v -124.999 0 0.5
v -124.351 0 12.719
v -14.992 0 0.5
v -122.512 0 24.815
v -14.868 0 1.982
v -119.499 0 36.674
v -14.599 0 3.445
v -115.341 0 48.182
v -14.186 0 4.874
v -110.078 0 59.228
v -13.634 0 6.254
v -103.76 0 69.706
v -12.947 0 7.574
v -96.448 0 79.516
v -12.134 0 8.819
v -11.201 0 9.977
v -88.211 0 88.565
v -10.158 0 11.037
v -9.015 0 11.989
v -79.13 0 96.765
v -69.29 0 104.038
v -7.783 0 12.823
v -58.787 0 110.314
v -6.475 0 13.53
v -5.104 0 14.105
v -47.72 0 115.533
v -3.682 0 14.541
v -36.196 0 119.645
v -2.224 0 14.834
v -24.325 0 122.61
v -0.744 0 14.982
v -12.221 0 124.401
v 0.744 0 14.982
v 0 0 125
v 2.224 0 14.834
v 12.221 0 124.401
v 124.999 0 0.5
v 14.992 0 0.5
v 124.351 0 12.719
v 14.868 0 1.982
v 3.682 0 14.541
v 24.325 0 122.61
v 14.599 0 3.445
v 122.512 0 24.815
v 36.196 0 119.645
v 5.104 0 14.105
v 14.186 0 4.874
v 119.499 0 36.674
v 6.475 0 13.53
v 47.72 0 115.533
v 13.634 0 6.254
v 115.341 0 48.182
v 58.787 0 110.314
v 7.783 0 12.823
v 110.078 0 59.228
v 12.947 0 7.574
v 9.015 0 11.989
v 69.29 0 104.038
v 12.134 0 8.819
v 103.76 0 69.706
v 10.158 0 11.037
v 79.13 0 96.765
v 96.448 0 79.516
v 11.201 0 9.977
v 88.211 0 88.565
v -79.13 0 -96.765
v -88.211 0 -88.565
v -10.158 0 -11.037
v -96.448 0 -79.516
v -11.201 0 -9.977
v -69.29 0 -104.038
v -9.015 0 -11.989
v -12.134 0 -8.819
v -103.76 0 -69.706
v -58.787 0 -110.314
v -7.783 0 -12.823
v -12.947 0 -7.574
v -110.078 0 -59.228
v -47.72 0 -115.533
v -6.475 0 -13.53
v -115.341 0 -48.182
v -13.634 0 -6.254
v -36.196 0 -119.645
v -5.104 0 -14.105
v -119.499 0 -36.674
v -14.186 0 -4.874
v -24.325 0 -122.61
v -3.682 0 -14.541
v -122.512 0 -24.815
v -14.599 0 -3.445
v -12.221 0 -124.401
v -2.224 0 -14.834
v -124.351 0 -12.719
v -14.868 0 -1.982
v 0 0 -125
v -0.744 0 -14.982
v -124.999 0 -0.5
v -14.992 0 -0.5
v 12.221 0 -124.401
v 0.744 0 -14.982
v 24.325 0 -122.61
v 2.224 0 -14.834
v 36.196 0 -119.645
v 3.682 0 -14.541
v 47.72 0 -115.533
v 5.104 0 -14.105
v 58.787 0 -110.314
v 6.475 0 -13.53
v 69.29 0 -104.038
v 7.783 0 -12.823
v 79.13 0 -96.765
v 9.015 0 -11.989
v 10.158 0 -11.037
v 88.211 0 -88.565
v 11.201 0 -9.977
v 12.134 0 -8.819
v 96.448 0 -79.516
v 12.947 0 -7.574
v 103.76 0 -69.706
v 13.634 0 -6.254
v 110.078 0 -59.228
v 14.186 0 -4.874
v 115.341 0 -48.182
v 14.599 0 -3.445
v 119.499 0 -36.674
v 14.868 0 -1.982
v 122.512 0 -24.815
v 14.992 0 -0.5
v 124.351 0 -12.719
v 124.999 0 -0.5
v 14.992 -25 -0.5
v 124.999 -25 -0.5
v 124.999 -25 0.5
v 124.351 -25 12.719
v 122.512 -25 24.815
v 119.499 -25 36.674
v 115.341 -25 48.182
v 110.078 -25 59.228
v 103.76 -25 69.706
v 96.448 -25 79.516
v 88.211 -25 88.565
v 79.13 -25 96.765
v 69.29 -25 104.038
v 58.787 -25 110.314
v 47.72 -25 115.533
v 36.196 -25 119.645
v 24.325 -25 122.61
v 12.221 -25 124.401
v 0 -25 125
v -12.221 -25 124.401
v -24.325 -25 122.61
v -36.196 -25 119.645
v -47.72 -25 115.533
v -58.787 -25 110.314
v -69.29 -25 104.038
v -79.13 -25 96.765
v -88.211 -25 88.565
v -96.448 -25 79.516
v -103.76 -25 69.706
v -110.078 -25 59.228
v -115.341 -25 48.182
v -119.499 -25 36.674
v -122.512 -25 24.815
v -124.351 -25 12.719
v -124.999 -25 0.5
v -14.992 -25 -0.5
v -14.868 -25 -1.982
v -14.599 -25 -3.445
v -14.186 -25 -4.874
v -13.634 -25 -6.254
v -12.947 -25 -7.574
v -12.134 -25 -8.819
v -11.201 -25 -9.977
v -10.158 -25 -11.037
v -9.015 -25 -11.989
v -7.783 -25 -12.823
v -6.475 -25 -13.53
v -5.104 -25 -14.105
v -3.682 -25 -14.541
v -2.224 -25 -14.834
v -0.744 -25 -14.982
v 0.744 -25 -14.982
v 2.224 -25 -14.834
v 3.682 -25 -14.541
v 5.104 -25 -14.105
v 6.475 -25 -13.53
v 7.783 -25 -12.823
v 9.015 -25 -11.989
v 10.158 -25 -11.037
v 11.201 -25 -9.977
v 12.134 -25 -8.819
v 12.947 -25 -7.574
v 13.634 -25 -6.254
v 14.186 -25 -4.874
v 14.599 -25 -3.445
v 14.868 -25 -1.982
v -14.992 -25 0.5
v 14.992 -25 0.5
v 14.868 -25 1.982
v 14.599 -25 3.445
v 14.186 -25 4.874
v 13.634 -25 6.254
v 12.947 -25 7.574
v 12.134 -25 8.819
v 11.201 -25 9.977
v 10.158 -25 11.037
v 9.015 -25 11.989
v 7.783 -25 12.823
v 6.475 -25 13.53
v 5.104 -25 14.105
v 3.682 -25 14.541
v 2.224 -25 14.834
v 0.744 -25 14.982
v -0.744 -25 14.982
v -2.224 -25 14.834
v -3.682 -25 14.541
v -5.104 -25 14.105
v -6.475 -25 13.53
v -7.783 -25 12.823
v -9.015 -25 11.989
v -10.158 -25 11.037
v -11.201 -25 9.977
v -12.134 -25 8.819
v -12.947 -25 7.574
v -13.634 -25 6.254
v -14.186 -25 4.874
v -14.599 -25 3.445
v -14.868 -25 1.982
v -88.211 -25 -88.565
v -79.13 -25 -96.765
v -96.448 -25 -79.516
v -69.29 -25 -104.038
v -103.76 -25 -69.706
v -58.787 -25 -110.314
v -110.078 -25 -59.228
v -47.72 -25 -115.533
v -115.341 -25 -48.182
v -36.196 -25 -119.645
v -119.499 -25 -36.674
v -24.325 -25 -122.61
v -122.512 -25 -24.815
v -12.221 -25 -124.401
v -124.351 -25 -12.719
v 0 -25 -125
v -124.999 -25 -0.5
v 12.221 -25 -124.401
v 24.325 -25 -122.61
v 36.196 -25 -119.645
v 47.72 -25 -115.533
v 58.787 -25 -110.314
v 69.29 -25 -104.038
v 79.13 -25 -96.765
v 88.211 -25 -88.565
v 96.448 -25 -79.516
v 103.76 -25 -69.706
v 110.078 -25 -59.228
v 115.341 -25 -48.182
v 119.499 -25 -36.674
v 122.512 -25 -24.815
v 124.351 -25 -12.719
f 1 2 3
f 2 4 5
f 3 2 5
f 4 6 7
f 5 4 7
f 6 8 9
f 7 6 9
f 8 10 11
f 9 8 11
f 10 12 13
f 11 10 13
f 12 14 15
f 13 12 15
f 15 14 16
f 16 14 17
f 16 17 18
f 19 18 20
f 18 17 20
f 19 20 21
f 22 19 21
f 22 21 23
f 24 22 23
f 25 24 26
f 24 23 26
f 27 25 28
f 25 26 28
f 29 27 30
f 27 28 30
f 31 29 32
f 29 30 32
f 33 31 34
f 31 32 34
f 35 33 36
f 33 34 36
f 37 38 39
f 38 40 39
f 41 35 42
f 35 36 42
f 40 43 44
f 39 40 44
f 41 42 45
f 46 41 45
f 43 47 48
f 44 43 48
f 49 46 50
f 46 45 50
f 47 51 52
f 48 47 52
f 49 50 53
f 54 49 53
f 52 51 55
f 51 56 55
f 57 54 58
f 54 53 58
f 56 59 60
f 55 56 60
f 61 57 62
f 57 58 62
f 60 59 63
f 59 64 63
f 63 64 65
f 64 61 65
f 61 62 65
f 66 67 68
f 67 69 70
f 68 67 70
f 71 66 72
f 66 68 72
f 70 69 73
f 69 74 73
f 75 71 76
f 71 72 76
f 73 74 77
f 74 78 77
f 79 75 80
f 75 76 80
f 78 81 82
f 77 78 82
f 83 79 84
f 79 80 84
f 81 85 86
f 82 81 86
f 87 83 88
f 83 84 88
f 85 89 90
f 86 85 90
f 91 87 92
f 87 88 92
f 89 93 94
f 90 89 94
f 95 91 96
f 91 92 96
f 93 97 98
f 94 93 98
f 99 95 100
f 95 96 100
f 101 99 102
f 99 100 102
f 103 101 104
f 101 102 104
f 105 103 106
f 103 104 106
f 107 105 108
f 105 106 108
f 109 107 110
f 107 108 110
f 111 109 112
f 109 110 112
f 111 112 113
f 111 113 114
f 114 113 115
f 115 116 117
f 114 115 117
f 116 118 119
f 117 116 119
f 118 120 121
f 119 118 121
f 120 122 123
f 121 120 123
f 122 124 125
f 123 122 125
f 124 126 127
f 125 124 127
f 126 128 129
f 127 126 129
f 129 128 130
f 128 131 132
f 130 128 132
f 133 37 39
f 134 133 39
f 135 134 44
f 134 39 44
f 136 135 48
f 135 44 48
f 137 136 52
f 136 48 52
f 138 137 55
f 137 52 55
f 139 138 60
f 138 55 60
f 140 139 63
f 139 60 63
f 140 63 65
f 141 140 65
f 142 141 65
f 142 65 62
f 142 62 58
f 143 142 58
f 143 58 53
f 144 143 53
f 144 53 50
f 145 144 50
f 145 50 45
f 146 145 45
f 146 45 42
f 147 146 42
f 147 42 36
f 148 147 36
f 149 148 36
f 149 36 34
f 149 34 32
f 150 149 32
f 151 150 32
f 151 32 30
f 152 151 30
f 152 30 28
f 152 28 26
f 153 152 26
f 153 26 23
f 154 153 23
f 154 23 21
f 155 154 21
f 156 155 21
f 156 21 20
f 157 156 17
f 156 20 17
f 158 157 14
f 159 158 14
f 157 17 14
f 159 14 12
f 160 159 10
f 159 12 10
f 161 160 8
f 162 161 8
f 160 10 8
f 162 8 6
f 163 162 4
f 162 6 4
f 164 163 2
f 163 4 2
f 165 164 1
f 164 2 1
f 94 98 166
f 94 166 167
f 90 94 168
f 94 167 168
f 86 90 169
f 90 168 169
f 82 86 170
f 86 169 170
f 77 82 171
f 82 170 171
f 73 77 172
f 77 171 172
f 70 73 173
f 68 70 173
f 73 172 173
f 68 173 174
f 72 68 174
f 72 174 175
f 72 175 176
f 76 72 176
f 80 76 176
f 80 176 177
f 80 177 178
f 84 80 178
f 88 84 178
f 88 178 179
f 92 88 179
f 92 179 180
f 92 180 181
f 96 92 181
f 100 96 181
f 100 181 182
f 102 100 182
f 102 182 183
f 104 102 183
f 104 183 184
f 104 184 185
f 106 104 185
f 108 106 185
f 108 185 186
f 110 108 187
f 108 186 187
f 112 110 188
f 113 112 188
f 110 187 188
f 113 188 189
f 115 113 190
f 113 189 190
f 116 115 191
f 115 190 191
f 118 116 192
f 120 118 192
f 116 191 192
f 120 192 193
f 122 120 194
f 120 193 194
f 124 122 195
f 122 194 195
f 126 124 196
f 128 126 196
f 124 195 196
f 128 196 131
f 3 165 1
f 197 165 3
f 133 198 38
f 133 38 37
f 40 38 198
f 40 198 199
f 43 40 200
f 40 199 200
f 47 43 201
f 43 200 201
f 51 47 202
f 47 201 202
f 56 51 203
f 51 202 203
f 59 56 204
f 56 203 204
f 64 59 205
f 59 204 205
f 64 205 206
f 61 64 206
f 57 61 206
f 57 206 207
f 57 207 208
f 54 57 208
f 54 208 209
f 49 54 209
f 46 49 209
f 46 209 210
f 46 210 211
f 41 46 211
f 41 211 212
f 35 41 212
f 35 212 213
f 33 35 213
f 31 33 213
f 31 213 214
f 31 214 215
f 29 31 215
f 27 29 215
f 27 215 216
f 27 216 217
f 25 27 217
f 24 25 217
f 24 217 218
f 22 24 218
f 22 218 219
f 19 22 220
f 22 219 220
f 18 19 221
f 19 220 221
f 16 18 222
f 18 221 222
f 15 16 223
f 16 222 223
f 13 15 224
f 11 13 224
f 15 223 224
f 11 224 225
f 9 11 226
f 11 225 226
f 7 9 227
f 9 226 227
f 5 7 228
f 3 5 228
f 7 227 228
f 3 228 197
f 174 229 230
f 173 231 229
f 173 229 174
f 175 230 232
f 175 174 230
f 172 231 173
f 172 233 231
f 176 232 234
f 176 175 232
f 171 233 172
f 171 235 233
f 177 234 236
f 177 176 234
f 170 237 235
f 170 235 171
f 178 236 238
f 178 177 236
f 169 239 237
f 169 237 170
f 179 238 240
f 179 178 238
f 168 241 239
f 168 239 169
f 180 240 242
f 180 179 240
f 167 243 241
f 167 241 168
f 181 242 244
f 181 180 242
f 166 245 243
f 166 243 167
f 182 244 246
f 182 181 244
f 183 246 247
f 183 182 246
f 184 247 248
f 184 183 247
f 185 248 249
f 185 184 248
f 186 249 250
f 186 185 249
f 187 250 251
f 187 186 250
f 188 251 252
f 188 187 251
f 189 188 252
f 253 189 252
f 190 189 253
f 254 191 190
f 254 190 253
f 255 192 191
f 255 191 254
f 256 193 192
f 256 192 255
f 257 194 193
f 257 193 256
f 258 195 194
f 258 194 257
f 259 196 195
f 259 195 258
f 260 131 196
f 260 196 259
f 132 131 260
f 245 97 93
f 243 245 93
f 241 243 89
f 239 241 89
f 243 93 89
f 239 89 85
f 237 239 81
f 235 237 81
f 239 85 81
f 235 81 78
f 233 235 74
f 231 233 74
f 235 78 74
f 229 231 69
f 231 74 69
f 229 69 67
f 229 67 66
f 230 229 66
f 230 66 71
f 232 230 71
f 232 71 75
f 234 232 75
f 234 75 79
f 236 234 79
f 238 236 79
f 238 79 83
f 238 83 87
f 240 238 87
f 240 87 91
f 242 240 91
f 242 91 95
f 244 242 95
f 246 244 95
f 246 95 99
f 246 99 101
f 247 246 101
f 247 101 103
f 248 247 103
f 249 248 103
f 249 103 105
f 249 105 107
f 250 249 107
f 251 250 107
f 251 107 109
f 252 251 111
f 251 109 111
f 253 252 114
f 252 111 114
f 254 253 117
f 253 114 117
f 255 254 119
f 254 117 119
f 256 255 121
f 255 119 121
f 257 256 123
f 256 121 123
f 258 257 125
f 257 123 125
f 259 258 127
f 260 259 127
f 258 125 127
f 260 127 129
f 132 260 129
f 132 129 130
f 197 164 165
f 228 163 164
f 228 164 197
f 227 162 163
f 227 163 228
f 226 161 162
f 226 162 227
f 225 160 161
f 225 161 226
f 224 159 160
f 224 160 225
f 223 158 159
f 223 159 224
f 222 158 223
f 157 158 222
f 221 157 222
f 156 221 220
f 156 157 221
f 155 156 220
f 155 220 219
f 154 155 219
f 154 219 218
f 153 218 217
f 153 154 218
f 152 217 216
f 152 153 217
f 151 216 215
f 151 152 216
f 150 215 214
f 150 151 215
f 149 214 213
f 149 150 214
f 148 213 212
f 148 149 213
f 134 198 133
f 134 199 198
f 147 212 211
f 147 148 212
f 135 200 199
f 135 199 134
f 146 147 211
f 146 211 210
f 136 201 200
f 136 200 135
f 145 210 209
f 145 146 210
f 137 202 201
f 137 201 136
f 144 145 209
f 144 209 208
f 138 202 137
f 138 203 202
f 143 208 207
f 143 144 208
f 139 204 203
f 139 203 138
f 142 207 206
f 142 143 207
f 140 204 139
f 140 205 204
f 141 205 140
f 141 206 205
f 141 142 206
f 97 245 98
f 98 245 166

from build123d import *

# Parameters (mm, degrees)
F0_R     = 125
F1_DEPTH = 25
F2_R     = 15
F3_DEPTH = 25
F4_W     = 500
F4_H     = 1
F5_DEPTH = 25


with BuildPart() as f1:
    # F0 (on Front) → F1 (new body)
    with BuildSketch(Plane.XZ):
        Circle(F0_R)
    extrude(amount=F1_DEPTH)

    # F2 (on face) → F3 (cut)
    with BuildSketch(Plane.XZ.offset(25)):
        Circle(F2_R)
    extrude(amount=-F3_DEPTH, mode=Mode.SUBTRACT)

    # F4 (on face) → F5 (cut)
    with BuildSketch(Plane.XZ.offset(25)):
        with Locations((-18.102854, 0)):
            Rectangle(F4_W, F4_H)
    extrude(amount=-F5_DEPTH, mode=Mode.SUBTRACT)


solid = f1.part
